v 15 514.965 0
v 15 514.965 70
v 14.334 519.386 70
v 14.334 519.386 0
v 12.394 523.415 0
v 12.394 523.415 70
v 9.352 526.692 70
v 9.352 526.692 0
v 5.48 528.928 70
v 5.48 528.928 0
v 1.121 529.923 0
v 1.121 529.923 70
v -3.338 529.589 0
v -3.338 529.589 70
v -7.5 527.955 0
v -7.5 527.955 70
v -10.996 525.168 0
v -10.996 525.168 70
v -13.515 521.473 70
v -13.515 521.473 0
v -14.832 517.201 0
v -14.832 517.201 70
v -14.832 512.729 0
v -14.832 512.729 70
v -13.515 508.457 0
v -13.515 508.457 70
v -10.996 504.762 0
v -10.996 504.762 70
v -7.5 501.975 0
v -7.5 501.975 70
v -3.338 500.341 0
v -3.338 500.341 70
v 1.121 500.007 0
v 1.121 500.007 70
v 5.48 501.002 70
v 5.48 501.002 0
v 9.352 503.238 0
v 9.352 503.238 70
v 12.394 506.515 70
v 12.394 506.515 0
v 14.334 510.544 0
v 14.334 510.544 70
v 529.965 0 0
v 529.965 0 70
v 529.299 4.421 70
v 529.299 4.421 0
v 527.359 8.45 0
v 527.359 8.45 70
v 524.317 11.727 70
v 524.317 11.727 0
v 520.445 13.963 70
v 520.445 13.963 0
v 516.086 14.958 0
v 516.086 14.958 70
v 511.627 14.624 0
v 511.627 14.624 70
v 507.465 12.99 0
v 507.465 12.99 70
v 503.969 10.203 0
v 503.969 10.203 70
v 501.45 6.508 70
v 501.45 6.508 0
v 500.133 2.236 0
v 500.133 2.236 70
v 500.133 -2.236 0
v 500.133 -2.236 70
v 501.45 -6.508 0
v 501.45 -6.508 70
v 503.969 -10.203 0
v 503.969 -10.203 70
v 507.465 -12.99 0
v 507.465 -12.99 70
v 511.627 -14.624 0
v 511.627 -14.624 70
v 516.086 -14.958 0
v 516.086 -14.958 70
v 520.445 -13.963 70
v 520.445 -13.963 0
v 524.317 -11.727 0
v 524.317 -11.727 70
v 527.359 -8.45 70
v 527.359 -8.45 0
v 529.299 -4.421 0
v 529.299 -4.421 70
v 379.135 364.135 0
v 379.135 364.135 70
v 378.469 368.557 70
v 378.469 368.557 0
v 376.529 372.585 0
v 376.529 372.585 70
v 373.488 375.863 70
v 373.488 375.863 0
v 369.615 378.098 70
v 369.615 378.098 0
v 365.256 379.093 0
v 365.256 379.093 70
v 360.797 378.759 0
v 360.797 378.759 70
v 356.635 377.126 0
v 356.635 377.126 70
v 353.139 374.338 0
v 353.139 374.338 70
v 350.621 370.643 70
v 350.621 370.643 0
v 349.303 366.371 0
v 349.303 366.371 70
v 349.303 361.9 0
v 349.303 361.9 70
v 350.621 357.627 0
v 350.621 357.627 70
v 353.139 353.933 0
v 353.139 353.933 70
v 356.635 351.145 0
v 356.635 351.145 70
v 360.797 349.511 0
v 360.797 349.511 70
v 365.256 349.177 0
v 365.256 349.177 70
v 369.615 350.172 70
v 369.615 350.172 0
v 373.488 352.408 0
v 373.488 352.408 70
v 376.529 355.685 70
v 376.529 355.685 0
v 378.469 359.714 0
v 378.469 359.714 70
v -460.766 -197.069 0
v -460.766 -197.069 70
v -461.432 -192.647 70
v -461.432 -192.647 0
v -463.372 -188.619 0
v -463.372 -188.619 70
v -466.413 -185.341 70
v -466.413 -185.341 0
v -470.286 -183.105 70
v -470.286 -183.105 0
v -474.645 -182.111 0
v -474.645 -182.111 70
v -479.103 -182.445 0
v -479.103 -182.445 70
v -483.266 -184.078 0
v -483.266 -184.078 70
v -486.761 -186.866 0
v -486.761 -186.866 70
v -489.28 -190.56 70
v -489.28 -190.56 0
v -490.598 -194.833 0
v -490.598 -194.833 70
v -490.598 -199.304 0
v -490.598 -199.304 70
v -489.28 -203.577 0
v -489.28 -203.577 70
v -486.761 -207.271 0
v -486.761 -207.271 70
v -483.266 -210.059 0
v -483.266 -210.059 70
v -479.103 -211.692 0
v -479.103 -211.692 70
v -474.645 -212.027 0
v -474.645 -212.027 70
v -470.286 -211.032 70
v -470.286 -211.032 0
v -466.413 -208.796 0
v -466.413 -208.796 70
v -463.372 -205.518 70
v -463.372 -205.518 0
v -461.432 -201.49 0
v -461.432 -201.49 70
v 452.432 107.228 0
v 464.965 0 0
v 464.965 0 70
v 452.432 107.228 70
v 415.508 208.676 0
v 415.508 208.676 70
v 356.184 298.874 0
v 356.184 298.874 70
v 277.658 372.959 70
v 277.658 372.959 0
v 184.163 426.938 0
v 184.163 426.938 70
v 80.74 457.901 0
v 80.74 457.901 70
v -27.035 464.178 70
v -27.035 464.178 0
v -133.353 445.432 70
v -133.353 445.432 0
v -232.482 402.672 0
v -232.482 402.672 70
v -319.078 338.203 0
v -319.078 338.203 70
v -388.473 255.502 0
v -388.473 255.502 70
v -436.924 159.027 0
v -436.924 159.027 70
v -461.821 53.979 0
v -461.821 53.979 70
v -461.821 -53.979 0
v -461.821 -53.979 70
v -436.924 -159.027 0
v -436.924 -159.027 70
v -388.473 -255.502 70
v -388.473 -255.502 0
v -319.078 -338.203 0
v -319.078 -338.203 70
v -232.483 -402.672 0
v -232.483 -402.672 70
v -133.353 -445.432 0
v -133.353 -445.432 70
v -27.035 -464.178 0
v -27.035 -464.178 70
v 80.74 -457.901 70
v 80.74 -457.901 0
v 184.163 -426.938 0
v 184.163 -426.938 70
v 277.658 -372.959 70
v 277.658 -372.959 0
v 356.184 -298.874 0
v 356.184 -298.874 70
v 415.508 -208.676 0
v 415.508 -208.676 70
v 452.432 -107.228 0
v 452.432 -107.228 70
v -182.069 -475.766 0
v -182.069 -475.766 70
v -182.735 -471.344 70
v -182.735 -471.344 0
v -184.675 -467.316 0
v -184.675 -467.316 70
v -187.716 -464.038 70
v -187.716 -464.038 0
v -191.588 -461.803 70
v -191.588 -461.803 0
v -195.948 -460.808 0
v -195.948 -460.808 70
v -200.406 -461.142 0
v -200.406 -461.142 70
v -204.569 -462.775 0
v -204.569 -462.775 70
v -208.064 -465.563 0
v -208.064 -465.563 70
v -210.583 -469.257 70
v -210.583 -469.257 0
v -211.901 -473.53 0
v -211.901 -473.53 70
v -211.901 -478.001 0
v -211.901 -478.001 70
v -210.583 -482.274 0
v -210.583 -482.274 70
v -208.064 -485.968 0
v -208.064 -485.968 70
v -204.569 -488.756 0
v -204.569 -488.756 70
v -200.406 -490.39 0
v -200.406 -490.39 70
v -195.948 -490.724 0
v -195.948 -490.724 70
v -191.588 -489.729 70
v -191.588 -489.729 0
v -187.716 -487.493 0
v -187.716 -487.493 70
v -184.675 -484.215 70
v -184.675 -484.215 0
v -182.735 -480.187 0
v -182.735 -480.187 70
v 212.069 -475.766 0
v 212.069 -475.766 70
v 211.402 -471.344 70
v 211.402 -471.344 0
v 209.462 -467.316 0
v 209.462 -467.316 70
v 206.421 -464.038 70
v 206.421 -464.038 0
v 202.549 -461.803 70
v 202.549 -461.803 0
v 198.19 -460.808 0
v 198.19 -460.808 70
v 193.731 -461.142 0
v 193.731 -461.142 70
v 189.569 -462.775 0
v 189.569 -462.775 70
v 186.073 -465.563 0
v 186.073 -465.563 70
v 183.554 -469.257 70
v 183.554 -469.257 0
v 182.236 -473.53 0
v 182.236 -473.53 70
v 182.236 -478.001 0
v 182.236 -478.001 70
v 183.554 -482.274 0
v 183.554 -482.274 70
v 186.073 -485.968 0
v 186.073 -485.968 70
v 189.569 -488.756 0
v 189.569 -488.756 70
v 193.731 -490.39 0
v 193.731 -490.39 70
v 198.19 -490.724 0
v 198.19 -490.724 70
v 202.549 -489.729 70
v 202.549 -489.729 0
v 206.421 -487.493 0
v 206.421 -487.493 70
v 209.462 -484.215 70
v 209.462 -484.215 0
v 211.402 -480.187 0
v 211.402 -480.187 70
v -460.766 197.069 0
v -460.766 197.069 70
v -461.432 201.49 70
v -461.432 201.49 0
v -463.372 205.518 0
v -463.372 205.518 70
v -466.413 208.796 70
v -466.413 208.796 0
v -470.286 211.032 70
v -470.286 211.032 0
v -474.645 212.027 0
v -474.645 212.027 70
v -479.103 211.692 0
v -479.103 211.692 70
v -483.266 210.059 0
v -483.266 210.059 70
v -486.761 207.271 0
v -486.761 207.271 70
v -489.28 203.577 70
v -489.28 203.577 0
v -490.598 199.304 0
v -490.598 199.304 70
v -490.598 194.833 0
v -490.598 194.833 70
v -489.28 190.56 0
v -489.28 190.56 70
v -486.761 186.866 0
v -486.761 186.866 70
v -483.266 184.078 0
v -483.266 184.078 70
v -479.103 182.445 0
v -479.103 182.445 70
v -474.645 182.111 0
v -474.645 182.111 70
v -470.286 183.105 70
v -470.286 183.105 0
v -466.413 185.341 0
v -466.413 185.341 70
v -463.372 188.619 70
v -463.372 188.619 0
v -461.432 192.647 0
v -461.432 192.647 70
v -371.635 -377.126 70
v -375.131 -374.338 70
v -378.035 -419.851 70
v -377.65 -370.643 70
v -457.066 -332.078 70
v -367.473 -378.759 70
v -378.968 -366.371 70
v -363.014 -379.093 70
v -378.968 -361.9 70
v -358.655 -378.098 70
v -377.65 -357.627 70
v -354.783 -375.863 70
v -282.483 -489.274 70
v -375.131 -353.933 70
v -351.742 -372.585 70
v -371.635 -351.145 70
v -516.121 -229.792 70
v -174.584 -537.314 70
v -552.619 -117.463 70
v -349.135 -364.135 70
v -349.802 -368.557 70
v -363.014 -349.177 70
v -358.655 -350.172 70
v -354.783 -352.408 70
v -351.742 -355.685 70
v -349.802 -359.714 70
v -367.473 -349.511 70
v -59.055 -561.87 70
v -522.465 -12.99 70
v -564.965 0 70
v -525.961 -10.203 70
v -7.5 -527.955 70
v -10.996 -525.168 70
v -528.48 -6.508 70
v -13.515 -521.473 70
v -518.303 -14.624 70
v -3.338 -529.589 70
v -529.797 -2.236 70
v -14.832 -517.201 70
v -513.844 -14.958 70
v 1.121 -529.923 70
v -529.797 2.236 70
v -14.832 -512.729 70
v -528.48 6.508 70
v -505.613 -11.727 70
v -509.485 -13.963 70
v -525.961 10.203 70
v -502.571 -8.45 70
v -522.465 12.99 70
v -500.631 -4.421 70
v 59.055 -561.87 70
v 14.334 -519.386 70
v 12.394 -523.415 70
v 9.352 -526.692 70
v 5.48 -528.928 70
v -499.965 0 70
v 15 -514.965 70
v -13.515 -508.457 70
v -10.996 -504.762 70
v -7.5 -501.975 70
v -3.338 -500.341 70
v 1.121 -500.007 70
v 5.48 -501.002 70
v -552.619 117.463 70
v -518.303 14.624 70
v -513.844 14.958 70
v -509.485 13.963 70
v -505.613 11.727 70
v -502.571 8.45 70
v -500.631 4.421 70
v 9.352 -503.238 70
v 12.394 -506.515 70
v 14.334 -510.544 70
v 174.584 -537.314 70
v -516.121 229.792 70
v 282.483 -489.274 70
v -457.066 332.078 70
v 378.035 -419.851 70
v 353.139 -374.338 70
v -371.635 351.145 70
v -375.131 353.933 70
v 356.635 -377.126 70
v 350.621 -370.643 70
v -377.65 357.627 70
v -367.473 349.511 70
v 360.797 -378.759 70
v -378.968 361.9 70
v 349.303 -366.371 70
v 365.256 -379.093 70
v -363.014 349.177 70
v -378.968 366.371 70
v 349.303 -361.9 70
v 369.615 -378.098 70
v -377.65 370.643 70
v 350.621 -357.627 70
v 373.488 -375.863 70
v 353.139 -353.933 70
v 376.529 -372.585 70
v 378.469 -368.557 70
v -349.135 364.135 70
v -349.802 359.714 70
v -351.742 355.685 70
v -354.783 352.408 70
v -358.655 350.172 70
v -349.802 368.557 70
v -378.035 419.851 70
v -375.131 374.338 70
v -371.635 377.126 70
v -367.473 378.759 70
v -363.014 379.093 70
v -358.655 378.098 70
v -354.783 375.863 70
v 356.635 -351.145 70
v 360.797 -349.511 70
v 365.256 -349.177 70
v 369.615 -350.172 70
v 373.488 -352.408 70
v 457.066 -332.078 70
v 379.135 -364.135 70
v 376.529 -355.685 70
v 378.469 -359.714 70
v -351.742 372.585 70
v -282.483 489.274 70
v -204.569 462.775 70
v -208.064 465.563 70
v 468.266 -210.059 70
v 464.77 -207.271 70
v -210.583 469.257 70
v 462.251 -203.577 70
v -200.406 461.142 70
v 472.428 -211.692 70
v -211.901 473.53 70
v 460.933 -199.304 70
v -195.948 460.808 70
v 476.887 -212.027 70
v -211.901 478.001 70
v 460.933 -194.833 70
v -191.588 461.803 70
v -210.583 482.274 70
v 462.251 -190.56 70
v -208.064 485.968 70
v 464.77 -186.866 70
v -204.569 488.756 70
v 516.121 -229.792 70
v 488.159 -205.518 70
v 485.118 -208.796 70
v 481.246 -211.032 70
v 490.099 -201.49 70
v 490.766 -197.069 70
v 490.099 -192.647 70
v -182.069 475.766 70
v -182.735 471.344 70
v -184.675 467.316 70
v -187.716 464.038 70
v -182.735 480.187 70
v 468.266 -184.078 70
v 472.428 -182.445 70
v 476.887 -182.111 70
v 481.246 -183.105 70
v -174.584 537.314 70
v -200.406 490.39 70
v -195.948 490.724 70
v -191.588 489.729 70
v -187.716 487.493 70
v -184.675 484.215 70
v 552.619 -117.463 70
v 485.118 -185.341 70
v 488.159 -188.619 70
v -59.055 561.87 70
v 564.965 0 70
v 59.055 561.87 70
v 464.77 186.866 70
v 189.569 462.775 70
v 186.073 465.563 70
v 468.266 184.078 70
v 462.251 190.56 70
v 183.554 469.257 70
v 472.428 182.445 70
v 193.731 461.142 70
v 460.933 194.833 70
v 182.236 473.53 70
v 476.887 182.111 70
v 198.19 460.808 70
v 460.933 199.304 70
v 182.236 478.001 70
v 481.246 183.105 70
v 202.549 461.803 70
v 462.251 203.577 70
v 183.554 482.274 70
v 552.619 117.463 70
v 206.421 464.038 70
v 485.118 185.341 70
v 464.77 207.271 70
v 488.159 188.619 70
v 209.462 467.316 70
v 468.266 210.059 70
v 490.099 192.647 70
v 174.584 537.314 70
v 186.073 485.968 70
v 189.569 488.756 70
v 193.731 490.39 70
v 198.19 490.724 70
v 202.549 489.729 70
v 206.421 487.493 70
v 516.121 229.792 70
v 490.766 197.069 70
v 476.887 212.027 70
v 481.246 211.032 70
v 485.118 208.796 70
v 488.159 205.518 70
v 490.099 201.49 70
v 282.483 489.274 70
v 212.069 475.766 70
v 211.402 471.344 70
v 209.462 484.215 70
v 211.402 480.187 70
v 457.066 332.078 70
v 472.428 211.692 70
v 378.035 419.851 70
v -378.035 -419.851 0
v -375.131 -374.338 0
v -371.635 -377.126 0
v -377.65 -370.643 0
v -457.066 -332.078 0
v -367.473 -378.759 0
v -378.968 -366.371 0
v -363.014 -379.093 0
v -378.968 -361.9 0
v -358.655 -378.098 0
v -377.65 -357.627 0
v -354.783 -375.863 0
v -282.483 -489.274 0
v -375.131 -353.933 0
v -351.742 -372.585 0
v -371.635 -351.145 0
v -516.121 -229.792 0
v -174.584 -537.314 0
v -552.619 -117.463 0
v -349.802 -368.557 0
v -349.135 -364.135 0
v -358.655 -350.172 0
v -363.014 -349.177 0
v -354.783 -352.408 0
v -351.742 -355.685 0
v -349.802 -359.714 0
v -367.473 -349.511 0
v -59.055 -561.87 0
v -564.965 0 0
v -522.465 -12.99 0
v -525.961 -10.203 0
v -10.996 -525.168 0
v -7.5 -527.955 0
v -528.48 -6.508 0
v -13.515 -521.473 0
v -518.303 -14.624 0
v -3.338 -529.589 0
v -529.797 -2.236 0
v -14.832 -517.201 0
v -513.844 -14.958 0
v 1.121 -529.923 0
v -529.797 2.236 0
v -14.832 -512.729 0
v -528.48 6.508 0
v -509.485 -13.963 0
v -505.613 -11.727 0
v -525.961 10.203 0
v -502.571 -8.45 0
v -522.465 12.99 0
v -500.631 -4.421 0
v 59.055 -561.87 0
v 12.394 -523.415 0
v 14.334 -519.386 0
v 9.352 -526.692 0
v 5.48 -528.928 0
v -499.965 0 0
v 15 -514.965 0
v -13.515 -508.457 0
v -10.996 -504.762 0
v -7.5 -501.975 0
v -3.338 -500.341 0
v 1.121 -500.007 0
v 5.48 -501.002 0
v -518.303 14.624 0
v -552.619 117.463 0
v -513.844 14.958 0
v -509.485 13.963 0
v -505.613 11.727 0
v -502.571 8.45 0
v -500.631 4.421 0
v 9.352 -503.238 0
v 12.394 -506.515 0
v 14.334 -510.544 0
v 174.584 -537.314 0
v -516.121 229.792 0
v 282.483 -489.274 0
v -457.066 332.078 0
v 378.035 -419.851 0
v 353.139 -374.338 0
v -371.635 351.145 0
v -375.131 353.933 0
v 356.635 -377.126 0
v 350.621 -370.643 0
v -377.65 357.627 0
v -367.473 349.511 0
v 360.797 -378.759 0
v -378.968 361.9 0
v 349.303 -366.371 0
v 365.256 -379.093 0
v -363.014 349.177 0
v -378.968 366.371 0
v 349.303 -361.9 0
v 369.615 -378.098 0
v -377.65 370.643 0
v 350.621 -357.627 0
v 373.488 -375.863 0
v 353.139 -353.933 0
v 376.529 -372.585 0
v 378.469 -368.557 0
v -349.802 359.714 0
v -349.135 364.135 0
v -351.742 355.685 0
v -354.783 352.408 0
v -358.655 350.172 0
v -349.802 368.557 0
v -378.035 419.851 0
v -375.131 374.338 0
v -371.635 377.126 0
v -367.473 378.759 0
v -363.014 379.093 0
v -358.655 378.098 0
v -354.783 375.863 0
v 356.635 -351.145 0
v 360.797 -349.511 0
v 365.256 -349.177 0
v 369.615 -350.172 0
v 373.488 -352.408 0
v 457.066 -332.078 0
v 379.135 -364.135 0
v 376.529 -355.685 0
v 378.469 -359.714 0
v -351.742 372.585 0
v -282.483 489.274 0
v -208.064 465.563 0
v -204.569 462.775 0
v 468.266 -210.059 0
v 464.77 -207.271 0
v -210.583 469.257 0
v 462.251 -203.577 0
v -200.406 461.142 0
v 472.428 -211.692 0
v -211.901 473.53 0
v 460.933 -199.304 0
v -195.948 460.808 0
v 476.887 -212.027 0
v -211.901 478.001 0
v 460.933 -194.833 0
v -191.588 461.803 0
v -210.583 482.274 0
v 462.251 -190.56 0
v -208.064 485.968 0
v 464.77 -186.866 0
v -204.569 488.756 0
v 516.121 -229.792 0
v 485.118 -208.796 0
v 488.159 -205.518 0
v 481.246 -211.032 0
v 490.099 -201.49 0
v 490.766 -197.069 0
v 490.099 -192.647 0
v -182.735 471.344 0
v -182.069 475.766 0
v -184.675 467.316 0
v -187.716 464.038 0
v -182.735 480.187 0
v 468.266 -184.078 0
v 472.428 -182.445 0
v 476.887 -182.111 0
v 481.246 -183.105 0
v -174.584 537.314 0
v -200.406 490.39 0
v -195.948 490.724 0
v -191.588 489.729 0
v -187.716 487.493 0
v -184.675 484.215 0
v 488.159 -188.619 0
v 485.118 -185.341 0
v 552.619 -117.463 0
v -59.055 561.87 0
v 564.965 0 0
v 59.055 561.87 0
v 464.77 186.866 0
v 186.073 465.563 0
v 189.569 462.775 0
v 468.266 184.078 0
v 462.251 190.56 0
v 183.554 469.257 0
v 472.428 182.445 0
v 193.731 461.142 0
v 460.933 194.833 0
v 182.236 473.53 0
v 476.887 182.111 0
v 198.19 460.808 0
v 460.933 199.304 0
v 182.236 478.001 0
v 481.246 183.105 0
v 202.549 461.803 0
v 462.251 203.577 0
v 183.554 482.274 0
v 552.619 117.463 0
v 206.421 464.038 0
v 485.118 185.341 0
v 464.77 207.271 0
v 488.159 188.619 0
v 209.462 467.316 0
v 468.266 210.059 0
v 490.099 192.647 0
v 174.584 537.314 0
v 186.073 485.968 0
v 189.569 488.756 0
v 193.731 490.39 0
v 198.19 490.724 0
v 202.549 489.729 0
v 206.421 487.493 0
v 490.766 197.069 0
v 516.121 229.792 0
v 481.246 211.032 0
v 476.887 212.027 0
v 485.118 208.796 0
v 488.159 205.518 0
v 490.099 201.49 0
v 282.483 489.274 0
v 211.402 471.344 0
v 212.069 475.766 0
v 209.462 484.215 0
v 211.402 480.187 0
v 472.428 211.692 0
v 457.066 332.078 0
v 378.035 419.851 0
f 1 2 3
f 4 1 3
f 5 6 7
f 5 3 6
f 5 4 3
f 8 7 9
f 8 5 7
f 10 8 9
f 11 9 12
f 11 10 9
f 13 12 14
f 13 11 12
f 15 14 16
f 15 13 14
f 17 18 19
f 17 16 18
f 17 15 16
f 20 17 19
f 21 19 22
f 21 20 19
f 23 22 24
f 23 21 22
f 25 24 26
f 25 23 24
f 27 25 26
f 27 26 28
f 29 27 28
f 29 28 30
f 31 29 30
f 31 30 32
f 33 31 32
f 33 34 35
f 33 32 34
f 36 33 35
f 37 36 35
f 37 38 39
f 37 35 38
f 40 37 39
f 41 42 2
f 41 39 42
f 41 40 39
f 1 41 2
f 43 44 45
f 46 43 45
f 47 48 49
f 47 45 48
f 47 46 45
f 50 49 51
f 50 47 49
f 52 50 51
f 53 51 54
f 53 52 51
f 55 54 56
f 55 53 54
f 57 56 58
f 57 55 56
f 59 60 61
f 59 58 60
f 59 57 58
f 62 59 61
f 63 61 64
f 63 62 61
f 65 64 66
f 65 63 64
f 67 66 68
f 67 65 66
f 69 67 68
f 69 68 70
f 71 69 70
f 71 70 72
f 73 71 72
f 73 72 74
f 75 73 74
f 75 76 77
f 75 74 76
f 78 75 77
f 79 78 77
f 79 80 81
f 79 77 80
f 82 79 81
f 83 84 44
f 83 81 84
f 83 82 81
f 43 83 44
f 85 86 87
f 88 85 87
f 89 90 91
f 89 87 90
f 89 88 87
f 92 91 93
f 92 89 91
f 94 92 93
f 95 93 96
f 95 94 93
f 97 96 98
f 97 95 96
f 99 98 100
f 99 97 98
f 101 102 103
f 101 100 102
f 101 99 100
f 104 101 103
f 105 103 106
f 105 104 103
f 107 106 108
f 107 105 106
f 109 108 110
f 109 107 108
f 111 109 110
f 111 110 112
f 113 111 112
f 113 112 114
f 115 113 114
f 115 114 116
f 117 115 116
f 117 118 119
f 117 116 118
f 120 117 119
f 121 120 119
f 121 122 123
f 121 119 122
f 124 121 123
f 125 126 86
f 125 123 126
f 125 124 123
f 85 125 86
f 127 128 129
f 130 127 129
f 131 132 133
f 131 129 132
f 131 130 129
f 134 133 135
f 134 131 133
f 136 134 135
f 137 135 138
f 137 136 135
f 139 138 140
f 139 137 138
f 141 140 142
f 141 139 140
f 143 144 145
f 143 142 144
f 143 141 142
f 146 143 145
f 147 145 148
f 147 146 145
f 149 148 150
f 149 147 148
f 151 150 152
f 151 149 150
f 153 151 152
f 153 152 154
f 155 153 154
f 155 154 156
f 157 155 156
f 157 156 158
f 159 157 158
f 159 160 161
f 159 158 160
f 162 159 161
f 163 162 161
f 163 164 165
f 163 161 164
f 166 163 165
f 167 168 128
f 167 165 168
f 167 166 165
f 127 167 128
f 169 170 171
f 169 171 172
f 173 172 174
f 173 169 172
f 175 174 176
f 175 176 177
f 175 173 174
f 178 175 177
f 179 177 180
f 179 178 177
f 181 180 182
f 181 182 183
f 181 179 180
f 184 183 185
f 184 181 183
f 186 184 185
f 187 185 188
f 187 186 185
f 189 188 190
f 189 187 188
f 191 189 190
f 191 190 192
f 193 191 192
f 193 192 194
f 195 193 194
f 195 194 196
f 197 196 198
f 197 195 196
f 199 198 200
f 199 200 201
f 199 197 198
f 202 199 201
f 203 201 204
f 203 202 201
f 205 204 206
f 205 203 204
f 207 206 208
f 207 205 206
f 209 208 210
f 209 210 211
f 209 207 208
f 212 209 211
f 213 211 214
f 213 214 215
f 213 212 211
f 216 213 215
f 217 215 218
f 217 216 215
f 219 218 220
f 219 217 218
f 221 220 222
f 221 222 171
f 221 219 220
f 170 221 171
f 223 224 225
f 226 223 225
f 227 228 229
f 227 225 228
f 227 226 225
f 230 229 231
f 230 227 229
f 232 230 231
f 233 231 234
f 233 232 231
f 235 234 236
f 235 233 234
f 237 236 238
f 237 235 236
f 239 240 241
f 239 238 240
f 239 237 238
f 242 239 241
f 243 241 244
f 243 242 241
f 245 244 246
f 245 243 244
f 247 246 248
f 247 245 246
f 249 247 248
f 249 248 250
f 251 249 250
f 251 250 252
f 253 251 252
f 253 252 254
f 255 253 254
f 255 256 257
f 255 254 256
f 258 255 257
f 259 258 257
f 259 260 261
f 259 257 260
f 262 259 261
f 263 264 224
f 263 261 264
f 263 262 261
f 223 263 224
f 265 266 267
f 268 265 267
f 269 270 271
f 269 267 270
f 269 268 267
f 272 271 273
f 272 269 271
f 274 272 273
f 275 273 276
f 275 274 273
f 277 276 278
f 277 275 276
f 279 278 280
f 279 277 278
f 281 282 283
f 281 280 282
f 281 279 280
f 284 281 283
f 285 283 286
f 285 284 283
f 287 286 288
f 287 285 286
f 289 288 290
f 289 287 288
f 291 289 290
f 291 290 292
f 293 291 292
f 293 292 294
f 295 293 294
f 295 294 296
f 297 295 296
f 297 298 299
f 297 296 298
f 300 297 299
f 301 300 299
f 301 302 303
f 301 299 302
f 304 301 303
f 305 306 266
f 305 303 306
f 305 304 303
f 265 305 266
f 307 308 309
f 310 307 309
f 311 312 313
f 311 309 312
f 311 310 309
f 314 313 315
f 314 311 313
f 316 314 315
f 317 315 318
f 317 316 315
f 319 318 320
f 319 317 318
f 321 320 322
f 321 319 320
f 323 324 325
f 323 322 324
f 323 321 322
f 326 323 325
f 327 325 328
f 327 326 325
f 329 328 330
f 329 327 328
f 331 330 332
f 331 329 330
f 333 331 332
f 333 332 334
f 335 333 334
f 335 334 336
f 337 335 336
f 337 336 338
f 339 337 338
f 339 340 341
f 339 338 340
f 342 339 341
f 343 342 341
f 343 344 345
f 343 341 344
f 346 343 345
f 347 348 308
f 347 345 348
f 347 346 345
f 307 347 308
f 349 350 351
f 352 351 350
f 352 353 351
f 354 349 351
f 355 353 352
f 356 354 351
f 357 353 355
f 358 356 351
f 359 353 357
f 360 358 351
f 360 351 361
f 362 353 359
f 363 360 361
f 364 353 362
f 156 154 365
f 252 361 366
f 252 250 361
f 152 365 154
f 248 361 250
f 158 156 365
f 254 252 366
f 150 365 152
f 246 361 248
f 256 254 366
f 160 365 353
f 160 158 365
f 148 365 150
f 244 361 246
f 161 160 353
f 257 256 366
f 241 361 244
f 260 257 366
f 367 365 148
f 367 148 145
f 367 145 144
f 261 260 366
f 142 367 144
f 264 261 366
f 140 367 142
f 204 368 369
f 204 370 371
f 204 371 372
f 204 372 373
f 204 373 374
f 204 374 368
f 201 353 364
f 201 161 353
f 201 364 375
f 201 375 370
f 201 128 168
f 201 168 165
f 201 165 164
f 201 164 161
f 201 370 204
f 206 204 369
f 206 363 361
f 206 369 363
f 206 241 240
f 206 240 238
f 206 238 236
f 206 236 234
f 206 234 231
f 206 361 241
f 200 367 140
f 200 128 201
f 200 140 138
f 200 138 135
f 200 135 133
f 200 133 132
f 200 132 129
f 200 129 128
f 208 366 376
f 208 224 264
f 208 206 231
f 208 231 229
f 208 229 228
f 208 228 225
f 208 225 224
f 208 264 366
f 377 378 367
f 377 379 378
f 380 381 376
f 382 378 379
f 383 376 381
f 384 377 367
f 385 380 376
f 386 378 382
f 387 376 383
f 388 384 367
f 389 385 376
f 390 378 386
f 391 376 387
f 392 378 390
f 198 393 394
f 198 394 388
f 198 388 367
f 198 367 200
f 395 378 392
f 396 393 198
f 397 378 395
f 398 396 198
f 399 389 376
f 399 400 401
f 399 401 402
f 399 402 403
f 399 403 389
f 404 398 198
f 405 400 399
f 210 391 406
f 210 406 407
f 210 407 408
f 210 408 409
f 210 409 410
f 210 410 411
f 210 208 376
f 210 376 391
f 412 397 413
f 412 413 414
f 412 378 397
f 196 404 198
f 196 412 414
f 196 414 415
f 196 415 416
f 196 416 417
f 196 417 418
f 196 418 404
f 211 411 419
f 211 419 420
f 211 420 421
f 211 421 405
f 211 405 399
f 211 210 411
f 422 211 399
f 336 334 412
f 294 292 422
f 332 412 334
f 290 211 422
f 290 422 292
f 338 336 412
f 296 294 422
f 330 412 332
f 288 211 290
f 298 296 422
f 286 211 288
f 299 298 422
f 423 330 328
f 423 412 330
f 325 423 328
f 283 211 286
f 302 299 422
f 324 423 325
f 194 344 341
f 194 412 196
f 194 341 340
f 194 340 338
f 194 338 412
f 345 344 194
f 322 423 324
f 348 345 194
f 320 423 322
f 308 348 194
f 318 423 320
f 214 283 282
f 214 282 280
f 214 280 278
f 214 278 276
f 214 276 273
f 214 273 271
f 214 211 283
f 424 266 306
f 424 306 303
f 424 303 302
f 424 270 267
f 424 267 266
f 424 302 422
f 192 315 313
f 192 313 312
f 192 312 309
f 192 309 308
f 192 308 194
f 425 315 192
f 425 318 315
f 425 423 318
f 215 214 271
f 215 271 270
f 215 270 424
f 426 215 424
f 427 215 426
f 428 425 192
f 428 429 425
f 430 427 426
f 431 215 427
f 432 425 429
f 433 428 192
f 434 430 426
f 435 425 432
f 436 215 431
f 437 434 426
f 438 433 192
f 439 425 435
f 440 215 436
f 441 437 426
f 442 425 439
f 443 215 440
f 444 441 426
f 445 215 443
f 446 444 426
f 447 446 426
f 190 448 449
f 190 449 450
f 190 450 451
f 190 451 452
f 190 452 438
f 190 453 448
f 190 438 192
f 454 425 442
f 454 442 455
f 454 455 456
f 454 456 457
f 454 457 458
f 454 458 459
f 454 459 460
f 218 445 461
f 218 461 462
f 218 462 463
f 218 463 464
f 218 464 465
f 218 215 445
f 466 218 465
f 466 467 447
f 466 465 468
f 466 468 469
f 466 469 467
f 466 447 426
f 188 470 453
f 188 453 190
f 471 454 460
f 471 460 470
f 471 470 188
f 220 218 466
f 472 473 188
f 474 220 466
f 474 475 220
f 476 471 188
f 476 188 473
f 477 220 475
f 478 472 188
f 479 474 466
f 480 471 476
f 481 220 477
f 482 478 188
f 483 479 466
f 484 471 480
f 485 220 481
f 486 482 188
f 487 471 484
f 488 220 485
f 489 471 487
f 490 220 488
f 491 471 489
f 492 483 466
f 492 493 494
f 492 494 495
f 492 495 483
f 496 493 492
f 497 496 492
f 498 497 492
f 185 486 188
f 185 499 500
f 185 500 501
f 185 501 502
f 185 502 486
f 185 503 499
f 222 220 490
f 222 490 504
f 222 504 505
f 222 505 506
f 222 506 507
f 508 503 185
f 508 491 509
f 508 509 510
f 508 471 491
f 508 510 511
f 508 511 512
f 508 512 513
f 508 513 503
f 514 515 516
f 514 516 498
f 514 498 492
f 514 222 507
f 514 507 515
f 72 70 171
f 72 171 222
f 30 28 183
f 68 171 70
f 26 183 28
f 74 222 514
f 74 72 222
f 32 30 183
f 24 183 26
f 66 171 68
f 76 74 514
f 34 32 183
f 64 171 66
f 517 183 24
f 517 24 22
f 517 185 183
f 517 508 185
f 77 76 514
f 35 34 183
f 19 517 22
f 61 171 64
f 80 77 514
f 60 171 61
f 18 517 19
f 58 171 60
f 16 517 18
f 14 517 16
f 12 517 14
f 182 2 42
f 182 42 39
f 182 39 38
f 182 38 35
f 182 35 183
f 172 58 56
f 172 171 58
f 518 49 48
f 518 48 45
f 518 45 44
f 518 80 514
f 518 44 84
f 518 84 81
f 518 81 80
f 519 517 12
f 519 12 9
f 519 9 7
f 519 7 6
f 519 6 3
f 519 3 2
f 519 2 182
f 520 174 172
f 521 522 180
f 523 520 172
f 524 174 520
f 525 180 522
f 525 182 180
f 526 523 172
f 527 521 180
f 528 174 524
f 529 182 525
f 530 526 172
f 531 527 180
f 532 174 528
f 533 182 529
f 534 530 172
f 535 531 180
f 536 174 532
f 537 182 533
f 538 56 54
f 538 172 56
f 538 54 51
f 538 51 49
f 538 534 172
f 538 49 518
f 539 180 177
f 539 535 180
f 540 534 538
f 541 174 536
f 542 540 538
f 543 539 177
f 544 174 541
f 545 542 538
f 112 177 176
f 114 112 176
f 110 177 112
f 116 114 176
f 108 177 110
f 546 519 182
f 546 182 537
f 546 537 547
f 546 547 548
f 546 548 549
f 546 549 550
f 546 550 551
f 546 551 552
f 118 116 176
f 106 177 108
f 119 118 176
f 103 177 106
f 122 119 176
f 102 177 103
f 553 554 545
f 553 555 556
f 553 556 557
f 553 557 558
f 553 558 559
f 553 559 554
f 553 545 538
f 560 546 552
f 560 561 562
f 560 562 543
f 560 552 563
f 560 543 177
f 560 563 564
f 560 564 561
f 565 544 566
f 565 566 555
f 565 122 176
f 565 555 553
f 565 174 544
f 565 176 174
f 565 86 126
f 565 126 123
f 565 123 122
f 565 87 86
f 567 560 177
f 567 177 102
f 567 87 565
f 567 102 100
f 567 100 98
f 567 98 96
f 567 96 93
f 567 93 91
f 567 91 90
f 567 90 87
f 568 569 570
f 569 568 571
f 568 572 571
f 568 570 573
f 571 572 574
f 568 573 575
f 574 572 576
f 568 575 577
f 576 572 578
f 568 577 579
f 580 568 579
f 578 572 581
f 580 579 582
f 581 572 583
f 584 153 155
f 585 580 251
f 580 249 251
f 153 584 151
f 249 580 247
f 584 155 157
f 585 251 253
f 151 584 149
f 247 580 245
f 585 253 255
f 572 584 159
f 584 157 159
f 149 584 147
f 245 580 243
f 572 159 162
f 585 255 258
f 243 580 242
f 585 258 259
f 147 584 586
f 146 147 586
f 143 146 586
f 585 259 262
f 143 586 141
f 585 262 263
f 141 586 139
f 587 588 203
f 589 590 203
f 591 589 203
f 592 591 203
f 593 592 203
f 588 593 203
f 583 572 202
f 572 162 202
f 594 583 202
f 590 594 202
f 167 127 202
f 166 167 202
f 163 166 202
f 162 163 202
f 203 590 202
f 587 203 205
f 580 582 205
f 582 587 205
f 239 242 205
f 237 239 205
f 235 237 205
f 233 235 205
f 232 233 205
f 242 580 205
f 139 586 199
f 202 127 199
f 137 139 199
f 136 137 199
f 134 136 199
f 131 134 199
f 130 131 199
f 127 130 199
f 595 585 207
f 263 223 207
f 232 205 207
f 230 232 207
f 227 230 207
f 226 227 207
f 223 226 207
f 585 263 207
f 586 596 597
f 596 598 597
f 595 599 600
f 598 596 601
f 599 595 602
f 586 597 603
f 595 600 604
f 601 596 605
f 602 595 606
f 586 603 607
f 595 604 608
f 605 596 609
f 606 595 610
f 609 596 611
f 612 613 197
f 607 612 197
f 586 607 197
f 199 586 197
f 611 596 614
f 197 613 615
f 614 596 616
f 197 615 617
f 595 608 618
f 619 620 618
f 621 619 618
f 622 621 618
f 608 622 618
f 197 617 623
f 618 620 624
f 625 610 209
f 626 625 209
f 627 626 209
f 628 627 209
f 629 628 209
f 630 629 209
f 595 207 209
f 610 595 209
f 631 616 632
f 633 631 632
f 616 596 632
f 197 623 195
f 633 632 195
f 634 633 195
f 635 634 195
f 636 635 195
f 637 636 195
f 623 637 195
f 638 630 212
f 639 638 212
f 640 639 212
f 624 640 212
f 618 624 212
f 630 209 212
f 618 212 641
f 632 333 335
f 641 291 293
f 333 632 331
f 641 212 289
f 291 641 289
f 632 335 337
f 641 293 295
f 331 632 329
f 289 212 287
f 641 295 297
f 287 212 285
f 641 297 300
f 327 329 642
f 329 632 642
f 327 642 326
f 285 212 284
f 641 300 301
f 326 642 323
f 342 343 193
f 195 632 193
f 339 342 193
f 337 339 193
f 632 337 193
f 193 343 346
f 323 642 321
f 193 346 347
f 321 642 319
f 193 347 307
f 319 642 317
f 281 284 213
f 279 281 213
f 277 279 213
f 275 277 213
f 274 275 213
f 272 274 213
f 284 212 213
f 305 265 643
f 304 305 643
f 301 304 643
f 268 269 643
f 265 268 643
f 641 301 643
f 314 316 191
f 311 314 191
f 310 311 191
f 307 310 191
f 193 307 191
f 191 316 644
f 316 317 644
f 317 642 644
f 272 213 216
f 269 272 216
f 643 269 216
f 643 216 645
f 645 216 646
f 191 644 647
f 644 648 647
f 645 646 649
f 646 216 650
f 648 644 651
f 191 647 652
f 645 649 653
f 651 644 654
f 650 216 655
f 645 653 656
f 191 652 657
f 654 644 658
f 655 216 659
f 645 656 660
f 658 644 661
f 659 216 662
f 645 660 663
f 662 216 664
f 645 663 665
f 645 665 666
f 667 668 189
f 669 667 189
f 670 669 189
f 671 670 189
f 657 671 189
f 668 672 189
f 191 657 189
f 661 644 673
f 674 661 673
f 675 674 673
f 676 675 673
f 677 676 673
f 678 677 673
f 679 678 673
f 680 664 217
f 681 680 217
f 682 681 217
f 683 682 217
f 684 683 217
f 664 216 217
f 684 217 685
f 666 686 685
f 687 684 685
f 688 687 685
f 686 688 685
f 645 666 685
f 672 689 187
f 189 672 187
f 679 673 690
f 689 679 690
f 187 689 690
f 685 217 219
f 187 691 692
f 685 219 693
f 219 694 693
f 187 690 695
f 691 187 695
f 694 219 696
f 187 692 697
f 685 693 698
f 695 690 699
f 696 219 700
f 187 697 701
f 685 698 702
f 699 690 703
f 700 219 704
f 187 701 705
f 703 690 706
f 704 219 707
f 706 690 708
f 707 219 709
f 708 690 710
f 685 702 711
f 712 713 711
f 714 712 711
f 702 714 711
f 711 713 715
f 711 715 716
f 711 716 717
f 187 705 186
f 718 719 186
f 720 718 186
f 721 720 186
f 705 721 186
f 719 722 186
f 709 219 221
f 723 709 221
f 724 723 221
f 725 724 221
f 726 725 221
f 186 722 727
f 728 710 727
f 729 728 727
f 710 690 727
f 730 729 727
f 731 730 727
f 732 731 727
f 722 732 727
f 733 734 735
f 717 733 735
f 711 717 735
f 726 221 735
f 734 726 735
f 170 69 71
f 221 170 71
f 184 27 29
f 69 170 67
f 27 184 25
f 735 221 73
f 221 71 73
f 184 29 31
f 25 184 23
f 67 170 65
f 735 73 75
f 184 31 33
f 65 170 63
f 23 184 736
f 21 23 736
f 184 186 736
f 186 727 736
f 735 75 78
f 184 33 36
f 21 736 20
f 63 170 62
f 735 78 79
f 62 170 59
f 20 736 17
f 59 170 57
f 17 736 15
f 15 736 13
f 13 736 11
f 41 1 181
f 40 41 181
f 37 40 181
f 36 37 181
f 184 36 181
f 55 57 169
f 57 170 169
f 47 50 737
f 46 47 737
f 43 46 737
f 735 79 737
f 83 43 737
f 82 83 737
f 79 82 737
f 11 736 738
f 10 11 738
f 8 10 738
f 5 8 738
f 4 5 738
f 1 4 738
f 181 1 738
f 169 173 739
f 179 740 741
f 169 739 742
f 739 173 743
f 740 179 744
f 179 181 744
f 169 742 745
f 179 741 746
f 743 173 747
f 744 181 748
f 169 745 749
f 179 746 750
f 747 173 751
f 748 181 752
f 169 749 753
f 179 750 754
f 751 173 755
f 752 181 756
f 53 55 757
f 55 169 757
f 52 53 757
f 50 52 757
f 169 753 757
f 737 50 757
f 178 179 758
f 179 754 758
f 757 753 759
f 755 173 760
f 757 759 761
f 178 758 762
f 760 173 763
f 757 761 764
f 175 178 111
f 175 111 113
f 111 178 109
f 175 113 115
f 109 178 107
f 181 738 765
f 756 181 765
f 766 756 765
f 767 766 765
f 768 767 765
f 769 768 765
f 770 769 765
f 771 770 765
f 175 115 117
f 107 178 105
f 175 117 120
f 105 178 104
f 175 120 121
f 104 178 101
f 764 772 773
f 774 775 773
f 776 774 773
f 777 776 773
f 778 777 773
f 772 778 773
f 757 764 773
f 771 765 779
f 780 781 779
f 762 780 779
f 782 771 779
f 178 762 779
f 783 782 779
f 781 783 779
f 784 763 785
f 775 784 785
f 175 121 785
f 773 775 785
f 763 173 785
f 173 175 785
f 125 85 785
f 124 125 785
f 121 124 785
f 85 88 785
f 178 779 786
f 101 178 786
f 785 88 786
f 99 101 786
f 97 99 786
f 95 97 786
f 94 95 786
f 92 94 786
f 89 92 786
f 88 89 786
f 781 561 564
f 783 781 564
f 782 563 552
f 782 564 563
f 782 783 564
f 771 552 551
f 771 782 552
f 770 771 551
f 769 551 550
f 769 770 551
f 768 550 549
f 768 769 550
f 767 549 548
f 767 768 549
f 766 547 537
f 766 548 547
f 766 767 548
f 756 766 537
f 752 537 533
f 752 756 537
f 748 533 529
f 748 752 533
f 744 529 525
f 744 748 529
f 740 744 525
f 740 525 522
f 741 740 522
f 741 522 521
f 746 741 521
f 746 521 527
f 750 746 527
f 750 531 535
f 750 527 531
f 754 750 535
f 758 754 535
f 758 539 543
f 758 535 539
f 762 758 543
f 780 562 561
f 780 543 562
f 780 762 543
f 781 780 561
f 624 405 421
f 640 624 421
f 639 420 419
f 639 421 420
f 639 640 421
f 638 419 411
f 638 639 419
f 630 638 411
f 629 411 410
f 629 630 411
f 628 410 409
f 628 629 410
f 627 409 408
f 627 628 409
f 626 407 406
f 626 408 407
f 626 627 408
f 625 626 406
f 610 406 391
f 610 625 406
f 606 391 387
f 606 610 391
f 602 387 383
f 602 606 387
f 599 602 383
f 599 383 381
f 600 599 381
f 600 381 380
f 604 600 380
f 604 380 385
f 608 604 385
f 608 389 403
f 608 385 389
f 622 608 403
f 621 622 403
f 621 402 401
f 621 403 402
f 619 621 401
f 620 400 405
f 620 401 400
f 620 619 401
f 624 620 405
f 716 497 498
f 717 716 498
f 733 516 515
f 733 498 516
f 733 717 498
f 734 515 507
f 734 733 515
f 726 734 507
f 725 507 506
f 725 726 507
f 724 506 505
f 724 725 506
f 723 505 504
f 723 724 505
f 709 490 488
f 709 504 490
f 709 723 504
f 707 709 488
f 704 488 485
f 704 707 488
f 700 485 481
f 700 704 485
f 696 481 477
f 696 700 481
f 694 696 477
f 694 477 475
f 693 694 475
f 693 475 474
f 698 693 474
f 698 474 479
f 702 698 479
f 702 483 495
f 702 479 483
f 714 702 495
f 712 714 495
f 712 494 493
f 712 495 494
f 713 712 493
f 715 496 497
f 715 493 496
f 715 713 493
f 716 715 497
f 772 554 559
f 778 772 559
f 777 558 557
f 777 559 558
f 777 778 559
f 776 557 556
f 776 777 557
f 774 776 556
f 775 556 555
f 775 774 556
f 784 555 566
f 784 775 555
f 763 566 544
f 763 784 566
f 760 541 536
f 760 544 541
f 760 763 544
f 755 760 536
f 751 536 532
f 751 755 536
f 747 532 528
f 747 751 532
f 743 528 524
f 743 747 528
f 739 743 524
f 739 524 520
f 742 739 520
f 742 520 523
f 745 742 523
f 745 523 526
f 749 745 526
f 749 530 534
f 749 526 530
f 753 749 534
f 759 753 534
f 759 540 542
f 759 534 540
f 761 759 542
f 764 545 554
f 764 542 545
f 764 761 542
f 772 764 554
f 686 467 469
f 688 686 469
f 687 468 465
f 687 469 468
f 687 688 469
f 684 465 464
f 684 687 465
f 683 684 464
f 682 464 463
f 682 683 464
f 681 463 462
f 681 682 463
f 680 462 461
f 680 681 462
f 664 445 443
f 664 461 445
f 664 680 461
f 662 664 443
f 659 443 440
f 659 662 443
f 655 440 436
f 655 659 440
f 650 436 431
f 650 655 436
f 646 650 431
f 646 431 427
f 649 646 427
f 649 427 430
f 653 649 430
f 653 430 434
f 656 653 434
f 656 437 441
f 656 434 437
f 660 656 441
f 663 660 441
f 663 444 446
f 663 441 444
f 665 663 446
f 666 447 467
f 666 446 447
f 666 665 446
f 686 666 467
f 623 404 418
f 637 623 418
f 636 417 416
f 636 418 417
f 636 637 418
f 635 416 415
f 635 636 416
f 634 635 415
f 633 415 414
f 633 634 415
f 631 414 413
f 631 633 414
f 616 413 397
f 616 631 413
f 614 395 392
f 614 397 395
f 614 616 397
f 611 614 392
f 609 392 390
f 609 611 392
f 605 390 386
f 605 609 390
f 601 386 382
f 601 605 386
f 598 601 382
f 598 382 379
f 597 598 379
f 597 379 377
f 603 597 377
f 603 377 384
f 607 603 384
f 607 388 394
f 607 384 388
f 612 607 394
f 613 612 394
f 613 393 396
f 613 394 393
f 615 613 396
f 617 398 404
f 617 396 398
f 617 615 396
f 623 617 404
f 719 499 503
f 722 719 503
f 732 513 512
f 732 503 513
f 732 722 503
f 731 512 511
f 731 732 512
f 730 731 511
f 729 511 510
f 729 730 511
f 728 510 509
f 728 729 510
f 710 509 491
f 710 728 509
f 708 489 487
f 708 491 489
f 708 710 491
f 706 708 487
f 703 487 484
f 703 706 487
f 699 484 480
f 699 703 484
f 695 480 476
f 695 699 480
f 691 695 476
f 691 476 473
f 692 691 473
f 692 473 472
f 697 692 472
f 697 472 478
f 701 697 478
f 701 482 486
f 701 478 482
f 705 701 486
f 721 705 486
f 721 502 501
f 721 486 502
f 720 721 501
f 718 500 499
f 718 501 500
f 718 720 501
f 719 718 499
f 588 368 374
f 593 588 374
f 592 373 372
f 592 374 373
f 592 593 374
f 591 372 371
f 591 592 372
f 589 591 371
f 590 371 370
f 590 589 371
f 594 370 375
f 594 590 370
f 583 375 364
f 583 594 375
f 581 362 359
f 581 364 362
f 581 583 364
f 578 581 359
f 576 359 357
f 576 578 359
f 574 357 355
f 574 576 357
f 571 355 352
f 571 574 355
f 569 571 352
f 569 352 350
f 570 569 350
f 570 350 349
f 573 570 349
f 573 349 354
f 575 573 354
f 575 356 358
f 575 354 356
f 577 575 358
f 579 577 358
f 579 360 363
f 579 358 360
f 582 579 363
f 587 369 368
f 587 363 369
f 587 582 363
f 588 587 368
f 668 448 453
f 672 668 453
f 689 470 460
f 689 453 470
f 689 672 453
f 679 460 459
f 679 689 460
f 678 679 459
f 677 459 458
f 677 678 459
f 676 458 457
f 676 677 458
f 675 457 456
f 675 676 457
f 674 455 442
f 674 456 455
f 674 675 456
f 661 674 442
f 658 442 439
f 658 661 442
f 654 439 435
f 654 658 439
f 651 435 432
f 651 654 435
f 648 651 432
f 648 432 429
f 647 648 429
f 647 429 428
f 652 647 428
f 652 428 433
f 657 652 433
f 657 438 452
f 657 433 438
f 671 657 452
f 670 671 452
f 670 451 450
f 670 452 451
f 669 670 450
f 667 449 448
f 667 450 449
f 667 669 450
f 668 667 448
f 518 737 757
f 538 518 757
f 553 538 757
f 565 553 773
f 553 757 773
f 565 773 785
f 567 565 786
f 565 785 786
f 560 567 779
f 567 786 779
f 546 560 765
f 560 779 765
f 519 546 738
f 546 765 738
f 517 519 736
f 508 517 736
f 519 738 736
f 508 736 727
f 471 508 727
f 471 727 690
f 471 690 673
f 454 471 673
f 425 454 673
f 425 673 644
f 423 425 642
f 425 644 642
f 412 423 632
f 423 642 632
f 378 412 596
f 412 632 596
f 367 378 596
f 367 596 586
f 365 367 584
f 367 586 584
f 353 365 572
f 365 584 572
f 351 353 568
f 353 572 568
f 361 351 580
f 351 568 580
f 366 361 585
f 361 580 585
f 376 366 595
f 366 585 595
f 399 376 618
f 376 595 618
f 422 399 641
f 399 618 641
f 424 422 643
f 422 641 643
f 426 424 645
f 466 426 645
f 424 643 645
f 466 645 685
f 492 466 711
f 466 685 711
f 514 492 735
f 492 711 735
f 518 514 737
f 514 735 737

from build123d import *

# Parameters (mm, degrees)
SKETCH1_R               = 564.965
SKETCH1_R_2             = 464.965
BOSS_EXTRUDE1_DEPTH     = 70
CUT_EXTRUDE2_DEPTH      = 803.041708672
CUT_EXTRUDE2_DEPTH_BACK = 803.041708672
SKETCH3_R               = 15


with BuildPart() as part:
    # Sketch1 → Boss-Extrude1 (new body)
    with BuildSketch(Plane.XY):
        Circle(SKETCH1_R)
        Circle(SKETCH1_R_2, mode=Mode.SUBTRACT)
    extrude(amount=BOSS_EXTRUDE1_DEPTH)

    # Sketch3 → Cut-Extrude2 (cut, two sides: drawn at the far end of the back side and taken through both)
    with BuildSketch(Plane.XY.offset(70).offset(-CUT_EXTRUDE2_DEPTH_BACK)):
        with Locations((197.068573748, 475.76562346)):
            Circle(SKETCH3_R)
        with Locations((364.135243574, 364.135243574)):
            Circle(SKETCH3_R)
        with Locations((475.76562346, 197.068573748)):
            Circle(SKETCH3_R)
        with Locations((514.965, 0)):
            Circle(SKETCH3_R)
        with Locations((475.76562346, -197.068573748)):
            Circle(SKETCH3_R)
        with Locations((364.135243574, -364.135243574)):
            Circle(SKETCH3_R)
        with Locations((197.068573748, -475.76562346)):
            Circle(SKETCH3_R)
        with Locations((0, -514.965)):
            Circle(SKETCH3_R)
        with Locations((-197.068573748, -475.76562346)):
            Circle(SKETCH3_R)
        with Locations((-364.135243574, -364.135243574)):
            Circle(SKETCH3_R)
        with Locations((-475.76562346, -197.068573748)):
            Circle(SKETCH3_R)
        with Locations((-514.965, 0)):
            Circle(SKETCH3_R)
        with Locations((-475.76562346, 197.068573748)):
            Circle(SKETCH3_R)
        with Locations((-364.135243574, 364.135243574)):
            Circle(SKETCH3_R)
        with Locations((-197.068573748, 475.76562346)):
            Circle(SKETCH3_R)
        with Locations((0, 514.965)):
            Circle(SKETCH3_R)
    extrude(amount=CUT_EXTRUDE2_DEPTH + CUT_EXTRUDE2_DEPTH_BACK, mode=Mode.SUBTRACT)


solid = part.part
